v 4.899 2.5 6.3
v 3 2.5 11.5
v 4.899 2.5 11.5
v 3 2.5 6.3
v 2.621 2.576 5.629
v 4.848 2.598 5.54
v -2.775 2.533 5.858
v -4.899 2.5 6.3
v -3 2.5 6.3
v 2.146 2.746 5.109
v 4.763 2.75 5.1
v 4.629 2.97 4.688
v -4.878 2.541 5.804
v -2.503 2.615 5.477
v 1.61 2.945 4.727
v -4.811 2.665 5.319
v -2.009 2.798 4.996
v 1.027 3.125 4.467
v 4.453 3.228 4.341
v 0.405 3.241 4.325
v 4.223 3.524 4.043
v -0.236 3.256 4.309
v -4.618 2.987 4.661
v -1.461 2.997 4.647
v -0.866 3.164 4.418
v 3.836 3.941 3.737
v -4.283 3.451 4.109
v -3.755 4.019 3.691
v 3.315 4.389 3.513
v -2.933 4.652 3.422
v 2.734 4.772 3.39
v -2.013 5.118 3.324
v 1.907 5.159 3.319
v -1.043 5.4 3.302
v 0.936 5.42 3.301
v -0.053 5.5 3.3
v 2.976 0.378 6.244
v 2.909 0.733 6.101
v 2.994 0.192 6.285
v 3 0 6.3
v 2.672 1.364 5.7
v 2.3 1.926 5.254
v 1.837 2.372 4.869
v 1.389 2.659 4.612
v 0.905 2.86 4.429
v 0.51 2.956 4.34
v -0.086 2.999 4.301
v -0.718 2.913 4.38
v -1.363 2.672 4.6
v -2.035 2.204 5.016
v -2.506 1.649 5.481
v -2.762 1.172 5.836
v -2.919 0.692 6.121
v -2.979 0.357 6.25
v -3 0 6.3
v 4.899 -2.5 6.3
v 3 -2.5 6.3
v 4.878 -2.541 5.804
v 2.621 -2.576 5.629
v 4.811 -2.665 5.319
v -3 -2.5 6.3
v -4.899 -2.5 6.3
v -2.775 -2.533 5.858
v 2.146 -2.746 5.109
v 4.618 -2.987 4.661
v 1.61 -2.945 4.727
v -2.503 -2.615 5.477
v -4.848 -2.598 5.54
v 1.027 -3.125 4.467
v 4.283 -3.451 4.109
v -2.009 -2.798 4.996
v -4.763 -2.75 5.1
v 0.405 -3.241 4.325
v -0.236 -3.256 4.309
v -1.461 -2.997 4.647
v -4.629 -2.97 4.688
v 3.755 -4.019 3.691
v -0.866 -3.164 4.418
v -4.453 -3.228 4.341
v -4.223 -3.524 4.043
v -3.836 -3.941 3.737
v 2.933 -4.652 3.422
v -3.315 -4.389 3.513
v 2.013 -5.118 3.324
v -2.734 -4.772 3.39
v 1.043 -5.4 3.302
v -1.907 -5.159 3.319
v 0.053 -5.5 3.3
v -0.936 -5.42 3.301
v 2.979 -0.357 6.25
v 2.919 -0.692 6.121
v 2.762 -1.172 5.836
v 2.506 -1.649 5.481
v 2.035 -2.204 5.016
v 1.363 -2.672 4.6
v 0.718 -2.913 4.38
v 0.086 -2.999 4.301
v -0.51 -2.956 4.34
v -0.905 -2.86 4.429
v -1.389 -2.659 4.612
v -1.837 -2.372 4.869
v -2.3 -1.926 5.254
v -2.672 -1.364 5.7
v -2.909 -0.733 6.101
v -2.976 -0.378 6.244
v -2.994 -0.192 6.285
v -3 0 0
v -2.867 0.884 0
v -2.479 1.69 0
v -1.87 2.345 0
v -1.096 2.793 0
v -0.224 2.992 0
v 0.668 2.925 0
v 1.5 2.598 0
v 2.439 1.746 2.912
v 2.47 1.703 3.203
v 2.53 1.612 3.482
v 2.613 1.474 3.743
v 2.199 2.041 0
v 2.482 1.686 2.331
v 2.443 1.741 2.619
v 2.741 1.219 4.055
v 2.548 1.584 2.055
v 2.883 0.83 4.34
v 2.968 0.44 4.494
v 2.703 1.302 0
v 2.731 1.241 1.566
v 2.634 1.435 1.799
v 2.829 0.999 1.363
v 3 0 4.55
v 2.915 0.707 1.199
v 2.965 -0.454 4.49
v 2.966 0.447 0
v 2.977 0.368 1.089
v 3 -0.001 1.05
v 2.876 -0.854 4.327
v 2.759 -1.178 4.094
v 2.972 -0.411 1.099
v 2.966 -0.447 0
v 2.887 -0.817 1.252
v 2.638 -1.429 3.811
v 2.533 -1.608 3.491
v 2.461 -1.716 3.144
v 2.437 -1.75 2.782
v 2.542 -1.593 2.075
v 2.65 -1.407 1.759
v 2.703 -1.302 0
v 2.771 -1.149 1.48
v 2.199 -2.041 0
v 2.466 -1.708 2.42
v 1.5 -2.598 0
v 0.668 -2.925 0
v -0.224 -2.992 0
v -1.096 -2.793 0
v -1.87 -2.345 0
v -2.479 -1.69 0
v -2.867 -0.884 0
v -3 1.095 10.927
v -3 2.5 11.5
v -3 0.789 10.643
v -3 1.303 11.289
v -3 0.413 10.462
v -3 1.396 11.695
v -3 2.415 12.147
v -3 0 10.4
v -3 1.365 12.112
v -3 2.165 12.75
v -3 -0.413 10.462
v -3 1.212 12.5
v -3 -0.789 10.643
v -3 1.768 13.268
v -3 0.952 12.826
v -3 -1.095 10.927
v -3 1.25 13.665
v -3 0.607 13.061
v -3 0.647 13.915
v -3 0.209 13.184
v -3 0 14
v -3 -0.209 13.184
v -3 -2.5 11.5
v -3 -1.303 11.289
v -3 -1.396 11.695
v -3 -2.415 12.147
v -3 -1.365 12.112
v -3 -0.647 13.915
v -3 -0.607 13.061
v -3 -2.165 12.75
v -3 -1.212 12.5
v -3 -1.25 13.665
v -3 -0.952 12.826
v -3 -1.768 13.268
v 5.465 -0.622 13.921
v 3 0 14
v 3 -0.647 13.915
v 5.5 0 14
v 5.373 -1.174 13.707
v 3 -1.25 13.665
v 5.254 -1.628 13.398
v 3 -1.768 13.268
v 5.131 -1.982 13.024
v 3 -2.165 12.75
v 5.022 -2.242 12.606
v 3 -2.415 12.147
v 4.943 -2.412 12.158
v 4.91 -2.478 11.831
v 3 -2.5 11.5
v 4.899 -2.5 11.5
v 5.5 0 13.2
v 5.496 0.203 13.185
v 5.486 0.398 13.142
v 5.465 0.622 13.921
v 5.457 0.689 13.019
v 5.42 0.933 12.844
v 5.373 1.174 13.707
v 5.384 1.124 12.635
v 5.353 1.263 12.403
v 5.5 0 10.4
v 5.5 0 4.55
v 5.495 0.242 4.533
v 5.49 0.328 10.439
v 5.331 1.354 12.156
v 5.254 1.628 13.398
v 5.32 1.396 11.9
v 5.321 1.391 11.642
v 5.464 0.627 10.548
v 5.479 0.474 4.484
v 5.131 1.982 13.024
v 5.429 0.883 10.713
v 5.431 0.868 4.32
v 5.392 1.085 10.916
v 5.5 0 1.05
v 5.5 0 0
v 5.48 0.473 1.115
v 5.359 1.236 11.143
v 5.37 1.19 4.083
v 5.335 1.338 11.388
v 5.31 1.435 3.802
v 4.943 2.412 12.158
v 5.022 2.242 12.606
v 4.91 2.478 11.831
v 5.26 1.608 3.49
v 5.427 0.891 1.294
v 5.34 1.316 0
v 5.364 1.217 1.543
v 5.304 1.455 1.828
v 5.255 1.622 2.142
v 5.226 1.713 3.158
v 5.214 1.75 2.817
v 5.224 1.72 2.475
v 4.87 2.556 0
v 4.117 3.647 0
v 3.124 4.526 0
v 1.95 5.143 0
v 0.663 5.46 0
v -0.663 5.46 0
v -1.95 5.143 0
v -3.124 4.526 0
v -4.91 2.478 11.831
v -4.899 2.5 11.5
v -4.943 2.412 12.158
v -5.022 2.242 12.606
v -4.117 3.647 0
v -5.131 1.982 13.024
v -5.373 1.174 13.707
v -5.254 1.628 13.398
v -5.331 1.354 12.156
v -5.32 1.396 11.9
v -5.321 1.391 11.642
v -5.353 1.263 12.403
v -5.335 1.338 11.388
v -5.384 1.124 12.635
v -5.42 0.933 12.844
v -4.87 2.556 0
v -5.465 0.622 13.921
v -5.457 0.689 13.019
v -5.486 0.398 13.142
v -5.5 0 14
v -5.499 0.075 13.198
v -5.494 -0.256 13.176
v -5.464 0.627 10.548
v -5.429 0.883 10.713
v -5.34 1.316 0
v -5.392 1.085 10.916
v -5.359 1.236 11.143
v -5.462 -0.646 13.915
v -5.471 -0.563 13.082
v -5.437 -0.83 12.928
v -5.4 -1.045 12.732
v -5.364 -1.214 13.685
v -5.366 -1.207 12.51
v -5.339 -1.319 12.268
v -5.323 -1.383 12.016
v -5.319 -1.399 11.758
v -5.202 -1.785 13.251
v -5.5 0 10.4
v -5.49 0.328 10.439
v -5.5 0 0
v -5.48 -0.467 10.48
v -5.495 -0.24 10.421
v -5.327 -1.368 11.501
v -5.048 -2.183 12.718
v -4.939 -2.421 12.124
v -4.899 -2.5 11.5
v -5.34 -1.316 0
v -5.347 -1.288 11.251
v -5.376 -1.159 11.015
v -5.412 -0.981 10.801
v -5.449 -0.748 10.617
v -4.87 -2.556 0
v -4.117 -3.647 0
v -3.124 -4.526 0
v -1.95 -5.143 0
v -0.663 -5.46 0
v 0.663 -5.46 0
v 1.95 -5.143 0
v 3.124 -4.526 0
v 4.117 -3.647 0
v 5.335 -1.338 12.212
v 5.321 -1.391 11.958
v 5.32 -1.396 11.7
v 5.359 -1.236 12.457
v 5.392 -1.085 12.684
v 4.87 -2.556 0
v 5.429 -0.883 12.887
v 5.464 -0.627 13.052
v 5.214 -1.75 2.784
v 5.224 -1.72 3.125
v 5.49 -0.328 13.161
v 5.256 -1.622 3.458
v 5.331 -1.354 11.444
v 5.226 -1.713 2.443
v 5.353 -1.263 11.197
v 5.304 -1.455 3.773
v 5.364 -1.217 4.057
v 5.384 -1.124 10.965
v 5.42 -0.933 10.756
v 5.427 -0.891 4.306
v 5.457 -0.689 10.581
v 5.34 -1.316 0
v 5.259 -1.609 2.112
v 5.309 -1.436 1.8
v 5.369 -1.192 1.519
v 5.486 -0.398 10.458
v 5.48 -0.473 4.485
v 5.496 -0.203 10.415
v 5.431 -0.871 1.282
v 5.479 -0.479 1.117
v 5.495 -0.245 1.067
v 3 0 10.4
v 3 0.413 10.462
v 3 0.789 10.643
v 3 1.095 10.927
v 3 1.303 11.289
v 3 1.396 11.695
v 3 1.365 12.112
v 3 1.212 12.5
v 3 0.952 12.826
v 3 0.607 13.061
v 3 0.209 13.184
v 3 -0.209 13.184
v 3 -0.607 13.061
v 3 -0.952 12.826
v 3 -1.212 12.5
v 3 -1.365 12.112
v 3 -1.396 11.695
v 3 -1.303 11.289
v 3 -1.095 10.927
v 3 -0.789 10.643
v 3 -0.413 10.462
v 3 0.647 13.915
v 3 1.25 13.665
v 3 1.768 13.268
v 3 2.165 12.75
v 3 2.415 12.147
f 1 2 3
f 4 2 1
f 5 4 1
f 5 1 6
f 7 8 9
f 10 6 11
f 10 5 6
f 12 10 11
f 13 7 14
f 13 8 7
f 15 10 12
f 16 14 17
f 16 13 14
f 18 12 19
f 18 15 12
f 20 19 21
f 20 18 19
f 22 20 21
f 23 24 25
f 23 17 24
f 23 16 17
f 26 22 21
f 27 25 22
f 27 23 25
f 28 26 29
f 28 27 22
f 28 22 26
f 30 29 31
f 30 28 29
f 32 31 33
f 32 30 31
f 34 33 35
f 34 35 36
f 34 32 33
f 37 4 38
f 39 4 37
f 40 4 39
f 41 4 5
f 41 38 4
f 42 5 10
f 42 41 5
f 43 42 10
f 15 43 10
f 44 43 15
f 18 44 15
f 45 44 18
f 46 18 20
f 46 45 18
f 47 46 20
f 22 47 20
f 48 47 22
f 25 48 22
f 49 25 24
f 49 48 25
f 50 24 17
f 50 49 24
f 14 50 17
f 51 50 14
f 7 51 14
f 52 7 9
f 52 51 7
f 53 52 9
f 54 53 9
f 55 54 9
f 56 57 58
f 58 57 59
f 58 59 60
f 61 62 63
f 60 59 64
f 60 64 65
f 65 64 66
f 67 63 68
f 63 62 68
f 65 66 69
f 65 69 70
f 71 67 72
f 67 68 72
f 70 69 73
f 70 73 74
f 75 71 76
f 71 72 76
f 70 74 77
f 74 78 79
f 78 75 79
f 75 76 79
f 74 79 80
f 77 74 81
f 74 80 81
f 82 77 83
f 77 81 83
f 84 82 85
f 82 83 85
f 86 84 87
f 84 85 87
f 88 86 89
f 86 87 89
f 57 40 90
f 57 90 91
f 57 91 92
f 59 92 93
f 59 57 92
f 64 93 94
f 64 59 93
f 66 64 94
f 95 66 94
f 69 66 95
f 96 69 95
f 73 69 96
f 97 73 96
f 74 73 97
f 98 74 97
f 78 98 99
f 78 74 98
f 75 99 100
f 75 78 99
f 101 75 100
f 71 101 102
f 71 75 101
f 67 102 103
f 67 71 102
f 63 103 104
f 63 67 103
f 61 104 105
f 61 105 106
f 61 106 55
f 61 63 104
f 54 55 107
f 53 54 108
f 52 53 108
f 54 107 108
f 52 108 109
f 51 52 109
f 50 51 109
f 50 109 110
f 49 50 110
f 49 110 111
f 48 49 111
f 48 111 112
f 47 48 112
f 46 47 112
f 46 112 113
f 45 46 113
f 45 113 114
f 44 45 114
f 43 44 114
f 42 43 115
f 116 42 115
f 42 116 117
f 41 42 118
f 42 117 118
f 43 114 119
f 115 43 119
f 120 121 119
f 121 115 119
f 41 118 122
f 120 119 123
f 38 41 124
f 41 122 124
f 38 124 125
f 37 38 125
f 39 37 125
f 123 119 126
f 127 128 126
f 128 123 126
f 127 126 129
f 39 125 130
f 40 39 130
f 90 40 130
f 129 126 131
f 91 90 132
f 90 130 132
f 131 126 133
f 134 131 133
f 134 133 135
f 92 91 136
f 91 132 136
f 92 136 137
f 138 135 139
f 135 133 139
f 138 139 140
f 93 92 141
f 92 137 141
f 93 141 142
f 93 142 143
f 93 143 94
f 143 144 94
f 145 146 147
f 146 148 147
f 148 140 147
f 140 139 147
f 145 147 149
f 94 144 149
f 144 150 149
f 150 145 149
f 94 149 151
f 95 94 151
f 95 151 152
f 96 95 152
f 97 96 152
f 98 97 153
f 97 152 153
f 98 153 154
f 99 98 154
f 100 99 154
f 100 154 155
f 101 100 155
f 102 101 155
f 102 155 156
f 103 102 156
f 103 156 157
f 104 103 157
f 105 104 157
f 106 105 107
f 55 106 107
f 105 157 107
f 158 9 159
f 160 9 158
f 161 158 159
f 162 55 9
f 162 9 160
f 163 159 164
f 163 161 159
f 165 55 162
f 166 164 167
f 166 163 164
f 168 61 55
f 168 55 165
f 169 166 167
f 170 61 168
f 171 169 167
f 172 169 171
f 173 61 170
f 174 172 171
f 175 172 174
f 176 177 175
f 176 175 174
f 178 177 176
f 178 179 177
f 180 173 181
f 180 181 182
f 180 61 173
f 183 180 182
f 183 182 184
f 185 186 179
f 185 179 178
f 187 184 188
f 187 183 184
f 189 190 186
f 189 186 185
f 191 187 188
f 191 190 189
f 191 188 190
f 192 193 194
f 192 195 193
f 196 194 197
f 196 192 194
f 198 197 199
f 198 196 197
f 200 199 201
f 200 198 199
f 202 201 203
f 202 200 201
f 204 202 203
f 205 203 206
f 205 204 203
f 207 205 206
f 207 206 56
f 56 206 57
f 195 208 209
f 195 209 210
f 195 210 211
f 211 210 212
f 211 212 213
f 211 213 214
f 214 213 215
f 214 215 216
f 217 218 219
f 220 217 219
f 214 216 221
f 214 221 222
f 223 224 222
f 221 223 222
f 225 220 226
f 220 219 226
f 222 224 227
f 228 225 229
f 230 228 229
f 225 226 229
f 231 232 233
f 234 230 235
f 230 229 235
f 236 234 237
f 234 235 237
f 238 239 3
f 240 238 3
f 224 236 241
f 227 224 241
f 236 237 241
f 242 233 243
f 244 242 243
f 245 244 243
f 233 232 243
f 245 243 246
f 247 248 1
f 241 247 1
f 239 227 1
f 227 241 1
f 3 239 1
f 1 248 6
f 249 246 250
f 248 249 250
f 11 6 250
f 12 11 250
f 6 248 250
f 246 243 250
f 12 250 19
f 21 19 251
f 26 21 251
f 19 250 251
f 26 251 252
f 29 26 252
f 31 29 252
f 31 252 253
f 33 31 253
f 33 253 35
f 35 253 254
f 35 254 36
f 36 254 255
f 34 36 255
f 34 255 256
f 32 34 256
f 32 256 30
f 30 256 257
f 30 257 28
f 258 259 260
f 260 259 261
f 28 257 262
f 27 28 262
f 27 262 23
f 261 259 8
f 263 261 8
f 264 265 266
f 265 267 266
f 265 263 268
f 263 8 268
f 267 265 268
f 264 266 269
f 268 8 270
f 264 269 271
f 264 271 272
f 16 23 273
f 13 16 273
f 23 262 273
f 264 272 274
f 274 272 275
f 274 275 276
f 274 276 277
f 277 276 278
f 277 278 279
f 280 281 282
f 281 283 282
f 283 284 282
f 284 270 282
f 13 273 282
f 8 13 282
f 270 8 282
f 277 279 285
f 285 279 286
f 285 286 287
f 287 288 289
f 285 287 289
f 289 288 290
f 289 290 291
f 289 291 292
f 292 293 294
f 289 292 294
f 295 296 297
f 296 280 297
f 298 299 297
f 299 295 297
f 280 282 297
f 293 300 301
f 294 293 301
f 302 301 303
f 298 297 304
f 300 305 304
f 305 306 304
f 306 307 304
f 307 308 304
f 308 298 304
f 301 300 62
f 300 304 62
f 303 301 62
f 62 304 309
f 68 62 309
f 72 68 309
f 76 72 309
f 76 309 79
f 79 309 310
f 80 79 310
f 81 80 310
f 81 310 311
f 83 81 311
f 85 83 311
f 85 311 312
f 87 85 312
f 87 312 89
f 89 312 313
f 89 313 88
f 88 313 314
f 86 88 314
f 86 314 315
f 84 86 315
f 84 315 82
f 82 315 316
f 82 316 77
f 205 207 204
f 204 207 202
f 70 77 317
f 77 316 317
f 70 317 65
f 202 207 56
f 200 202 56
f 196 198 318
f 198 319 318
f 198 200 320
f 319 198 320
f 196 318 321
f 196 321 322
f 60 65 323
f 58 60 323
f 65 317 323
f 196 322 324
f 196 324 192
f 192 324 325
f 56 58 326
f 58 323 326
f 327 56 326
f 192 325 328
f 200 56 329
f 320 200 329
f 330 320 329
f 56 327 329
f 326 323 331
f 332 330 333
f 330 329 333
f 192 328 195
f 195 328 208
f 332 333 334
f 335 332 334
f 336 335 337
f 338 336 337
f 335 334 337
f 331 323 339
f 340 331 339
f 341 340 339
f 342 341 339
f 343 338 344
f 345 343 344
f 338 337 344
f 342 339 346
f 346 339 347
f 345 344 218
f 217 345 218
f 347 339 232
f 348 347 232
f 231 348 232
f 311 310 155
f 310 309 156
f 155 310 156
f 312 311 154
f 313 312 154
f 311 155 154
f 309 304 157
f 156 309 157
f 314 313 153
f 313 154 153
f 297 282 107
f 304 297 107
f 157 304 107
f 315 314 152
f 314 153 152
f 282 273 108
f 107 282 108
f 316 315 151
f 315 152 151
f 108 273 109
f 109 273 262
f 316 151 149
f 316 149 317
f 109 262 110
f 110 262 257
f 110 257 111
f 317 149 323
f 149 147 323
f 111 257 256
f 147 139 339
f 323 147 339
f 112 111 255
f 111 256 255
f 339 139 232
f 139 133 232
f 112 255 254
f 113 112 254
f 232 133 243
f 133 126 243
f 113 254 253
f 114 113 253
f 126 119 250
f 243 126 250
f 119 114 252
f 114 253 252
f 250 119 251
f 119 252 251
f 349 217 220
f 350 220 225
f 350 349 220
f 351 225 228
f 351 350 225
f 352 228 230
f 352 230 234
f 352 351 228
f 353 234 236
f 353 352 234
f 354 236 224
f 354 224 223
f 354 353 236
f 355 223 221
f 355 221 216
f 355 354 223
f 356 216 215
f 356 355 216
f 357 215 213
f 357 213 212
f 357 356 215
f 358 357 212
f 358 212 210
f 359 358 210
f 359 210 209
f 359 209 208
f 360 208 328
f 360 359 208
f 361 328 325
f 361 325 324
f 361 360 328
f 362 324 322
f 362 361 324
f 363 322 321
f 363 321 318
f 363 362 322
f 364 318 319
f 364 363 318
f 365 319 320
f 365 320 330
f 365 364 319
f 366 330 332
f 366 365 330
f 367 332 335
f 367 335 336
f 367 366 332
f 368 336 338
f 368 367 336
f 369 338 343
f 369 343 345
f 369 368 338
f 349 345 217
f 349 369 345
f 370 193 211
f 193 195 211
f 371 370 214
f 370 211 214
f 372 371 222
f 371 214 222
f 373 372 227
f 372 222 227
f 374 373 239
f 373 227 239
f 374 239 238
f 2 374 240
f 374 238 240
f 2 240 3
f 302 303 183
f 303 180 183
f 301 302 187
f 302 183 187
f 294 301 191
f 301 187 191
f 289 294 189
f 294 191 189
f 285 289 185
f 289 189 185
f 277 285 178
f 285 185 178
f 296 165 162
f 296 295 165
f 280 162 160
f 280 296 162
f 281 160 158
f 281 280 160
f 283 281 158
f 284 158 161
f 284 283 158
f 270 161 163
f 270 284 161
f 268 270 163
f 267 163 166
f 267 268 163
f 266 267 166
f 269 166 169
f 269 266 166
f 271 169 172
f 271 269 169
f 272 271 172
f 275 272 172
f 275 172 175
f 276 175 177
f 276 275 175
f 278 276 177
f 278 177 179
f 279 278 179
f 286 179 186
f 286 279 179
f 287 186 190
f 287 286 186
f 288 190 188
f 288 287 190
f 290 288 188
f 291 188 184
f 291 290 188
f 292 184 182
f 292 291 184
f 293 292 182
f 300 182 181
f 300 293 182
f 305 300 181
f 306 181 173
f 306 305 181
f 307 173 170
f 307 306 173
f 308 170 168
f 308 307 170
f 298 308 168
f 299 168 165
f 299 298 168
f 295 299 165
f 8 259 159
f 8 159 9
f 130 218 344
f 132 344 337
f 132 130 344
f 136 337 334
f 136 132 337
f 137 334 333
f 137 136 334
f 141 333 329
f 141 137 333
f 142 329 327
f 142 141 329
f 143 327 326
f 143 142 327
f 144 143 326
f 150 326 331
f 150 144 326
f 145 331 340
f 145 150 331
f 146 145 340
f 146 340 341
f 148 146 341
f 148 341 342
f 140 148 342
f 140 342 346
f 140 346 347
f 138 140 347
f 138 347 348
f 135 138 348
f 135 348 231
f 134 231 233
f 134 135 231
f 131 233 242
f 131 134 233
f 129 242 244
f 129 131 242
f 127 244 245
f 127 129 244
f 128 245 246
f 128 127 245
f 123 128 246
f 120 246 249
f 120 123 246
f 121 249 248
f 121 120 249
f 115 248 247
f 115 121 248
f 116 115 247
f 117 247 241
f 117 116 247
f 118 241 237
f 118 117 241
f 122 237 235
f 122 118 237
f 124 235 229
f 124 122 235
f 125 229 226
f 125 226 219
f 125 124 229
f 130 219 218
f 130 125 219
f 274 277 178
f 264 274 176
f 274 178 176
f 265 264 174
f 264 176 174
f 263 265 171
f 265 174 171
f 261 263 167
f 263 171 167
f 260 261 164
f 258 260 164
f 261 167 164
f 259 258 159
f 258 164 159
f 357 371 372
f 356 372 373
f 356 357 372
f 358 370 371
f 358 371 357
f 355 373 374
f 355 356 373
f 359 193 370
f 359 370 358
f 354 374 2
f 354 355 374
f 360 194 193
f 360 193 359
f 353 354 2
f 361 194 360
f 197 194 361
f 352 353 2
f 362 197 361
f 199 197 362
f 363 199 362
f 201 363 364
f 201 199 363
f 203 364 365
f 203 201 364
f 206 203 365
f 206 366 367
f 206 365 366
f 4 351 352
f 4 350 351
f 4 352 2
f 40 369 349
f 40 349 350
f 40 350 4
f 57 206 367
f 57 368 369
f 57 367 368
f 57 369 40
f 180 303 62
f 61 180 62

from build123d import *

# Parameters (mm, degrees)
SKETCH_1_R               = 5.5
EXTRUDE_1_DEPTH          = 14
SKETCH_2_R               = 3
CUT_EXTRUDE_1_DEPTH      = 17.015617378
CUT_EXTRUDE_2_DEPTH      = 17.015617378
CUT_EXTRUDE_2_DEPTH_BACK = 17.015617378
CUT_EXTRUDE_3_DEPTH      = 17.015617534
CUT_EXTRUDE_3_DEPTH_BACK = 17.015617534
FILLET_1_R               = 2.5
SKETCH_5_R               = 1.75
CUT_EXTRUDE_4_DEPTH      = 17.015617534
CUT_EXTRUDE_5_DEPTH      = 17.015617534
CUT_EXTRUDE_5_DEPTH_BACK = 17.015617534
SKETCH_6_R               = 1.4


with BuildPart() as part:
    # 草图1 → 凸台-拉伸1 (new body)
    with BuildSketch(Plane.XY):
        Circle(SKETCH_1_R)
    extrude(amount=EXTRUDE_1_DEPTH)

    # 草图2 → 切除-拉伸1 (cut, through all)
    with BuildSketch(Plane(origin=(0, 0, 0), x_dir=(-1, 0, 0), z_dir=(0, 0, -1))):
        Circle(SKETCH_2_R)
    extrude(amount=-CUT_EXTRUDE_1_DEPTH, mode=Mode.SUBTRACT)

    # 草图3 → 切除-拉伸2 (cut, two sides: drawn at the far end of the back side and taken through both)
    with BuildSketch(Plane(origin=(0, 0, 0), x_dir=(1, 0, 0), z_dir=(0, 1, 0)).offset(-CUT_EXTRUDE_2_DEPTH_BACK)):
        with BuildLine():
            Line((-3, -14), (3, -14))
            Line((3, -14), (3, -6.3))
            ThreePointArc((3, -6.3), (0, -4.3), (-3, -6.3))
            Line((-3, -6.3), (-3, -14))
        make_face()
    extrude(amount=CUT_EXTRUDE_2_DEPTH + CUT_EXTRUDE_2_DEPTH_BACK, mode=Mode.SUBTRACT)

    # 草图4 → 切除-拉伸3 (cut, two sides: drawn at the far end of the back side and taken through both)
    with BuildSketch(Plane(origin=(0, 0, 0), x_dir=(0, 0, -1), z_dir=(1, 0, 0)).offset(-CUT_EXTRUDE_3_DEPTH_BACK)):
        with BuildLine():
            Line((-14, 2.5), (-6.3, 2.5))
            ThreePointArc((-6.3, 2.5), (-4.003021048, 3.570262273), (-3.344955373, 6.017408205))
            Line((-3.344955373, 6.017408205), (-3.344955373, 8.923023013))
            Line((-3.344955373, 8.923023013), (-14, 8.923023013))
            Line((-14, 8.923023013), (-14, 2.5))
        make_face()
        with BuildLine():
            Line((-14, -2.5), (-6.3, -2.5))
            ThreePointArc((-6.3, -2.5), (-3.674156249, -4.049157281), (-3.760209141, -7.096703602))
            Line((-3.760209141, -7.096703602), (-6.538750291, -8.043650362))
            Line((-6.538750291, -8.043650362), (-14, -8.043650362))
            Line((-14, -8.043650362), (-14, -2.5))
        make_face()
    extrude(amount=CUT_EXTRUDE_3_DEPTH + CUT_EXTRUDE_3_DEPTH_BACK, mode=Mode.SUBTRACT)

    # 圆角1
    fillet_1_edges = [part.edges().sort_by_distance(p)[0] for p in [
        (-3.949489743, -2.5, 14),
        (-3.949489743, 2.5, 14),
        (3.949489743, 2.5, 14),
        (3.949489743, -2.5, 14),
    ]]
    fillet(fillet_1_edges, radius=FILLET_1_R - 0.0001)  # a hair under: the kernel refuses the full size

    # 草图5 → 切除-拉伸4 (cut, through all)
    with BuildSketch(Plane(origin=(0, 0, 0), x_dir=(0, 0, -1), z_dir=(1, 0, 0))):
        with Locations(Location((-2.8, 0, 0), (0, 0, 180))):
            Circle(SKETCH_5_R)
    extrude(amount=CUT_EXTRUDE_4_DEPTH, mode=Mode.SUBTRACT)

    # 草图6 → 切除-拉伸5 (cut, two sides: drawn at the far end of the back side and taken through both)
    with BuildSketch(Plane(origin=(0, 0, 0), x_dir=(0, 0, -1), z_dir=(1, 0, 0)).offset(-CUT_EXTRUDE_5_DEPTH_BACK)):
        with Locations((-11.8, 0)):
            Circle(SKETCH_6_R)
    extrude(amount=CUT_EXTRUDE_5_DEPTH + CUT_EXTRUDE_5_DEPTH_BACK, mode=Mode.SUBTRACT)


solid = part.part
